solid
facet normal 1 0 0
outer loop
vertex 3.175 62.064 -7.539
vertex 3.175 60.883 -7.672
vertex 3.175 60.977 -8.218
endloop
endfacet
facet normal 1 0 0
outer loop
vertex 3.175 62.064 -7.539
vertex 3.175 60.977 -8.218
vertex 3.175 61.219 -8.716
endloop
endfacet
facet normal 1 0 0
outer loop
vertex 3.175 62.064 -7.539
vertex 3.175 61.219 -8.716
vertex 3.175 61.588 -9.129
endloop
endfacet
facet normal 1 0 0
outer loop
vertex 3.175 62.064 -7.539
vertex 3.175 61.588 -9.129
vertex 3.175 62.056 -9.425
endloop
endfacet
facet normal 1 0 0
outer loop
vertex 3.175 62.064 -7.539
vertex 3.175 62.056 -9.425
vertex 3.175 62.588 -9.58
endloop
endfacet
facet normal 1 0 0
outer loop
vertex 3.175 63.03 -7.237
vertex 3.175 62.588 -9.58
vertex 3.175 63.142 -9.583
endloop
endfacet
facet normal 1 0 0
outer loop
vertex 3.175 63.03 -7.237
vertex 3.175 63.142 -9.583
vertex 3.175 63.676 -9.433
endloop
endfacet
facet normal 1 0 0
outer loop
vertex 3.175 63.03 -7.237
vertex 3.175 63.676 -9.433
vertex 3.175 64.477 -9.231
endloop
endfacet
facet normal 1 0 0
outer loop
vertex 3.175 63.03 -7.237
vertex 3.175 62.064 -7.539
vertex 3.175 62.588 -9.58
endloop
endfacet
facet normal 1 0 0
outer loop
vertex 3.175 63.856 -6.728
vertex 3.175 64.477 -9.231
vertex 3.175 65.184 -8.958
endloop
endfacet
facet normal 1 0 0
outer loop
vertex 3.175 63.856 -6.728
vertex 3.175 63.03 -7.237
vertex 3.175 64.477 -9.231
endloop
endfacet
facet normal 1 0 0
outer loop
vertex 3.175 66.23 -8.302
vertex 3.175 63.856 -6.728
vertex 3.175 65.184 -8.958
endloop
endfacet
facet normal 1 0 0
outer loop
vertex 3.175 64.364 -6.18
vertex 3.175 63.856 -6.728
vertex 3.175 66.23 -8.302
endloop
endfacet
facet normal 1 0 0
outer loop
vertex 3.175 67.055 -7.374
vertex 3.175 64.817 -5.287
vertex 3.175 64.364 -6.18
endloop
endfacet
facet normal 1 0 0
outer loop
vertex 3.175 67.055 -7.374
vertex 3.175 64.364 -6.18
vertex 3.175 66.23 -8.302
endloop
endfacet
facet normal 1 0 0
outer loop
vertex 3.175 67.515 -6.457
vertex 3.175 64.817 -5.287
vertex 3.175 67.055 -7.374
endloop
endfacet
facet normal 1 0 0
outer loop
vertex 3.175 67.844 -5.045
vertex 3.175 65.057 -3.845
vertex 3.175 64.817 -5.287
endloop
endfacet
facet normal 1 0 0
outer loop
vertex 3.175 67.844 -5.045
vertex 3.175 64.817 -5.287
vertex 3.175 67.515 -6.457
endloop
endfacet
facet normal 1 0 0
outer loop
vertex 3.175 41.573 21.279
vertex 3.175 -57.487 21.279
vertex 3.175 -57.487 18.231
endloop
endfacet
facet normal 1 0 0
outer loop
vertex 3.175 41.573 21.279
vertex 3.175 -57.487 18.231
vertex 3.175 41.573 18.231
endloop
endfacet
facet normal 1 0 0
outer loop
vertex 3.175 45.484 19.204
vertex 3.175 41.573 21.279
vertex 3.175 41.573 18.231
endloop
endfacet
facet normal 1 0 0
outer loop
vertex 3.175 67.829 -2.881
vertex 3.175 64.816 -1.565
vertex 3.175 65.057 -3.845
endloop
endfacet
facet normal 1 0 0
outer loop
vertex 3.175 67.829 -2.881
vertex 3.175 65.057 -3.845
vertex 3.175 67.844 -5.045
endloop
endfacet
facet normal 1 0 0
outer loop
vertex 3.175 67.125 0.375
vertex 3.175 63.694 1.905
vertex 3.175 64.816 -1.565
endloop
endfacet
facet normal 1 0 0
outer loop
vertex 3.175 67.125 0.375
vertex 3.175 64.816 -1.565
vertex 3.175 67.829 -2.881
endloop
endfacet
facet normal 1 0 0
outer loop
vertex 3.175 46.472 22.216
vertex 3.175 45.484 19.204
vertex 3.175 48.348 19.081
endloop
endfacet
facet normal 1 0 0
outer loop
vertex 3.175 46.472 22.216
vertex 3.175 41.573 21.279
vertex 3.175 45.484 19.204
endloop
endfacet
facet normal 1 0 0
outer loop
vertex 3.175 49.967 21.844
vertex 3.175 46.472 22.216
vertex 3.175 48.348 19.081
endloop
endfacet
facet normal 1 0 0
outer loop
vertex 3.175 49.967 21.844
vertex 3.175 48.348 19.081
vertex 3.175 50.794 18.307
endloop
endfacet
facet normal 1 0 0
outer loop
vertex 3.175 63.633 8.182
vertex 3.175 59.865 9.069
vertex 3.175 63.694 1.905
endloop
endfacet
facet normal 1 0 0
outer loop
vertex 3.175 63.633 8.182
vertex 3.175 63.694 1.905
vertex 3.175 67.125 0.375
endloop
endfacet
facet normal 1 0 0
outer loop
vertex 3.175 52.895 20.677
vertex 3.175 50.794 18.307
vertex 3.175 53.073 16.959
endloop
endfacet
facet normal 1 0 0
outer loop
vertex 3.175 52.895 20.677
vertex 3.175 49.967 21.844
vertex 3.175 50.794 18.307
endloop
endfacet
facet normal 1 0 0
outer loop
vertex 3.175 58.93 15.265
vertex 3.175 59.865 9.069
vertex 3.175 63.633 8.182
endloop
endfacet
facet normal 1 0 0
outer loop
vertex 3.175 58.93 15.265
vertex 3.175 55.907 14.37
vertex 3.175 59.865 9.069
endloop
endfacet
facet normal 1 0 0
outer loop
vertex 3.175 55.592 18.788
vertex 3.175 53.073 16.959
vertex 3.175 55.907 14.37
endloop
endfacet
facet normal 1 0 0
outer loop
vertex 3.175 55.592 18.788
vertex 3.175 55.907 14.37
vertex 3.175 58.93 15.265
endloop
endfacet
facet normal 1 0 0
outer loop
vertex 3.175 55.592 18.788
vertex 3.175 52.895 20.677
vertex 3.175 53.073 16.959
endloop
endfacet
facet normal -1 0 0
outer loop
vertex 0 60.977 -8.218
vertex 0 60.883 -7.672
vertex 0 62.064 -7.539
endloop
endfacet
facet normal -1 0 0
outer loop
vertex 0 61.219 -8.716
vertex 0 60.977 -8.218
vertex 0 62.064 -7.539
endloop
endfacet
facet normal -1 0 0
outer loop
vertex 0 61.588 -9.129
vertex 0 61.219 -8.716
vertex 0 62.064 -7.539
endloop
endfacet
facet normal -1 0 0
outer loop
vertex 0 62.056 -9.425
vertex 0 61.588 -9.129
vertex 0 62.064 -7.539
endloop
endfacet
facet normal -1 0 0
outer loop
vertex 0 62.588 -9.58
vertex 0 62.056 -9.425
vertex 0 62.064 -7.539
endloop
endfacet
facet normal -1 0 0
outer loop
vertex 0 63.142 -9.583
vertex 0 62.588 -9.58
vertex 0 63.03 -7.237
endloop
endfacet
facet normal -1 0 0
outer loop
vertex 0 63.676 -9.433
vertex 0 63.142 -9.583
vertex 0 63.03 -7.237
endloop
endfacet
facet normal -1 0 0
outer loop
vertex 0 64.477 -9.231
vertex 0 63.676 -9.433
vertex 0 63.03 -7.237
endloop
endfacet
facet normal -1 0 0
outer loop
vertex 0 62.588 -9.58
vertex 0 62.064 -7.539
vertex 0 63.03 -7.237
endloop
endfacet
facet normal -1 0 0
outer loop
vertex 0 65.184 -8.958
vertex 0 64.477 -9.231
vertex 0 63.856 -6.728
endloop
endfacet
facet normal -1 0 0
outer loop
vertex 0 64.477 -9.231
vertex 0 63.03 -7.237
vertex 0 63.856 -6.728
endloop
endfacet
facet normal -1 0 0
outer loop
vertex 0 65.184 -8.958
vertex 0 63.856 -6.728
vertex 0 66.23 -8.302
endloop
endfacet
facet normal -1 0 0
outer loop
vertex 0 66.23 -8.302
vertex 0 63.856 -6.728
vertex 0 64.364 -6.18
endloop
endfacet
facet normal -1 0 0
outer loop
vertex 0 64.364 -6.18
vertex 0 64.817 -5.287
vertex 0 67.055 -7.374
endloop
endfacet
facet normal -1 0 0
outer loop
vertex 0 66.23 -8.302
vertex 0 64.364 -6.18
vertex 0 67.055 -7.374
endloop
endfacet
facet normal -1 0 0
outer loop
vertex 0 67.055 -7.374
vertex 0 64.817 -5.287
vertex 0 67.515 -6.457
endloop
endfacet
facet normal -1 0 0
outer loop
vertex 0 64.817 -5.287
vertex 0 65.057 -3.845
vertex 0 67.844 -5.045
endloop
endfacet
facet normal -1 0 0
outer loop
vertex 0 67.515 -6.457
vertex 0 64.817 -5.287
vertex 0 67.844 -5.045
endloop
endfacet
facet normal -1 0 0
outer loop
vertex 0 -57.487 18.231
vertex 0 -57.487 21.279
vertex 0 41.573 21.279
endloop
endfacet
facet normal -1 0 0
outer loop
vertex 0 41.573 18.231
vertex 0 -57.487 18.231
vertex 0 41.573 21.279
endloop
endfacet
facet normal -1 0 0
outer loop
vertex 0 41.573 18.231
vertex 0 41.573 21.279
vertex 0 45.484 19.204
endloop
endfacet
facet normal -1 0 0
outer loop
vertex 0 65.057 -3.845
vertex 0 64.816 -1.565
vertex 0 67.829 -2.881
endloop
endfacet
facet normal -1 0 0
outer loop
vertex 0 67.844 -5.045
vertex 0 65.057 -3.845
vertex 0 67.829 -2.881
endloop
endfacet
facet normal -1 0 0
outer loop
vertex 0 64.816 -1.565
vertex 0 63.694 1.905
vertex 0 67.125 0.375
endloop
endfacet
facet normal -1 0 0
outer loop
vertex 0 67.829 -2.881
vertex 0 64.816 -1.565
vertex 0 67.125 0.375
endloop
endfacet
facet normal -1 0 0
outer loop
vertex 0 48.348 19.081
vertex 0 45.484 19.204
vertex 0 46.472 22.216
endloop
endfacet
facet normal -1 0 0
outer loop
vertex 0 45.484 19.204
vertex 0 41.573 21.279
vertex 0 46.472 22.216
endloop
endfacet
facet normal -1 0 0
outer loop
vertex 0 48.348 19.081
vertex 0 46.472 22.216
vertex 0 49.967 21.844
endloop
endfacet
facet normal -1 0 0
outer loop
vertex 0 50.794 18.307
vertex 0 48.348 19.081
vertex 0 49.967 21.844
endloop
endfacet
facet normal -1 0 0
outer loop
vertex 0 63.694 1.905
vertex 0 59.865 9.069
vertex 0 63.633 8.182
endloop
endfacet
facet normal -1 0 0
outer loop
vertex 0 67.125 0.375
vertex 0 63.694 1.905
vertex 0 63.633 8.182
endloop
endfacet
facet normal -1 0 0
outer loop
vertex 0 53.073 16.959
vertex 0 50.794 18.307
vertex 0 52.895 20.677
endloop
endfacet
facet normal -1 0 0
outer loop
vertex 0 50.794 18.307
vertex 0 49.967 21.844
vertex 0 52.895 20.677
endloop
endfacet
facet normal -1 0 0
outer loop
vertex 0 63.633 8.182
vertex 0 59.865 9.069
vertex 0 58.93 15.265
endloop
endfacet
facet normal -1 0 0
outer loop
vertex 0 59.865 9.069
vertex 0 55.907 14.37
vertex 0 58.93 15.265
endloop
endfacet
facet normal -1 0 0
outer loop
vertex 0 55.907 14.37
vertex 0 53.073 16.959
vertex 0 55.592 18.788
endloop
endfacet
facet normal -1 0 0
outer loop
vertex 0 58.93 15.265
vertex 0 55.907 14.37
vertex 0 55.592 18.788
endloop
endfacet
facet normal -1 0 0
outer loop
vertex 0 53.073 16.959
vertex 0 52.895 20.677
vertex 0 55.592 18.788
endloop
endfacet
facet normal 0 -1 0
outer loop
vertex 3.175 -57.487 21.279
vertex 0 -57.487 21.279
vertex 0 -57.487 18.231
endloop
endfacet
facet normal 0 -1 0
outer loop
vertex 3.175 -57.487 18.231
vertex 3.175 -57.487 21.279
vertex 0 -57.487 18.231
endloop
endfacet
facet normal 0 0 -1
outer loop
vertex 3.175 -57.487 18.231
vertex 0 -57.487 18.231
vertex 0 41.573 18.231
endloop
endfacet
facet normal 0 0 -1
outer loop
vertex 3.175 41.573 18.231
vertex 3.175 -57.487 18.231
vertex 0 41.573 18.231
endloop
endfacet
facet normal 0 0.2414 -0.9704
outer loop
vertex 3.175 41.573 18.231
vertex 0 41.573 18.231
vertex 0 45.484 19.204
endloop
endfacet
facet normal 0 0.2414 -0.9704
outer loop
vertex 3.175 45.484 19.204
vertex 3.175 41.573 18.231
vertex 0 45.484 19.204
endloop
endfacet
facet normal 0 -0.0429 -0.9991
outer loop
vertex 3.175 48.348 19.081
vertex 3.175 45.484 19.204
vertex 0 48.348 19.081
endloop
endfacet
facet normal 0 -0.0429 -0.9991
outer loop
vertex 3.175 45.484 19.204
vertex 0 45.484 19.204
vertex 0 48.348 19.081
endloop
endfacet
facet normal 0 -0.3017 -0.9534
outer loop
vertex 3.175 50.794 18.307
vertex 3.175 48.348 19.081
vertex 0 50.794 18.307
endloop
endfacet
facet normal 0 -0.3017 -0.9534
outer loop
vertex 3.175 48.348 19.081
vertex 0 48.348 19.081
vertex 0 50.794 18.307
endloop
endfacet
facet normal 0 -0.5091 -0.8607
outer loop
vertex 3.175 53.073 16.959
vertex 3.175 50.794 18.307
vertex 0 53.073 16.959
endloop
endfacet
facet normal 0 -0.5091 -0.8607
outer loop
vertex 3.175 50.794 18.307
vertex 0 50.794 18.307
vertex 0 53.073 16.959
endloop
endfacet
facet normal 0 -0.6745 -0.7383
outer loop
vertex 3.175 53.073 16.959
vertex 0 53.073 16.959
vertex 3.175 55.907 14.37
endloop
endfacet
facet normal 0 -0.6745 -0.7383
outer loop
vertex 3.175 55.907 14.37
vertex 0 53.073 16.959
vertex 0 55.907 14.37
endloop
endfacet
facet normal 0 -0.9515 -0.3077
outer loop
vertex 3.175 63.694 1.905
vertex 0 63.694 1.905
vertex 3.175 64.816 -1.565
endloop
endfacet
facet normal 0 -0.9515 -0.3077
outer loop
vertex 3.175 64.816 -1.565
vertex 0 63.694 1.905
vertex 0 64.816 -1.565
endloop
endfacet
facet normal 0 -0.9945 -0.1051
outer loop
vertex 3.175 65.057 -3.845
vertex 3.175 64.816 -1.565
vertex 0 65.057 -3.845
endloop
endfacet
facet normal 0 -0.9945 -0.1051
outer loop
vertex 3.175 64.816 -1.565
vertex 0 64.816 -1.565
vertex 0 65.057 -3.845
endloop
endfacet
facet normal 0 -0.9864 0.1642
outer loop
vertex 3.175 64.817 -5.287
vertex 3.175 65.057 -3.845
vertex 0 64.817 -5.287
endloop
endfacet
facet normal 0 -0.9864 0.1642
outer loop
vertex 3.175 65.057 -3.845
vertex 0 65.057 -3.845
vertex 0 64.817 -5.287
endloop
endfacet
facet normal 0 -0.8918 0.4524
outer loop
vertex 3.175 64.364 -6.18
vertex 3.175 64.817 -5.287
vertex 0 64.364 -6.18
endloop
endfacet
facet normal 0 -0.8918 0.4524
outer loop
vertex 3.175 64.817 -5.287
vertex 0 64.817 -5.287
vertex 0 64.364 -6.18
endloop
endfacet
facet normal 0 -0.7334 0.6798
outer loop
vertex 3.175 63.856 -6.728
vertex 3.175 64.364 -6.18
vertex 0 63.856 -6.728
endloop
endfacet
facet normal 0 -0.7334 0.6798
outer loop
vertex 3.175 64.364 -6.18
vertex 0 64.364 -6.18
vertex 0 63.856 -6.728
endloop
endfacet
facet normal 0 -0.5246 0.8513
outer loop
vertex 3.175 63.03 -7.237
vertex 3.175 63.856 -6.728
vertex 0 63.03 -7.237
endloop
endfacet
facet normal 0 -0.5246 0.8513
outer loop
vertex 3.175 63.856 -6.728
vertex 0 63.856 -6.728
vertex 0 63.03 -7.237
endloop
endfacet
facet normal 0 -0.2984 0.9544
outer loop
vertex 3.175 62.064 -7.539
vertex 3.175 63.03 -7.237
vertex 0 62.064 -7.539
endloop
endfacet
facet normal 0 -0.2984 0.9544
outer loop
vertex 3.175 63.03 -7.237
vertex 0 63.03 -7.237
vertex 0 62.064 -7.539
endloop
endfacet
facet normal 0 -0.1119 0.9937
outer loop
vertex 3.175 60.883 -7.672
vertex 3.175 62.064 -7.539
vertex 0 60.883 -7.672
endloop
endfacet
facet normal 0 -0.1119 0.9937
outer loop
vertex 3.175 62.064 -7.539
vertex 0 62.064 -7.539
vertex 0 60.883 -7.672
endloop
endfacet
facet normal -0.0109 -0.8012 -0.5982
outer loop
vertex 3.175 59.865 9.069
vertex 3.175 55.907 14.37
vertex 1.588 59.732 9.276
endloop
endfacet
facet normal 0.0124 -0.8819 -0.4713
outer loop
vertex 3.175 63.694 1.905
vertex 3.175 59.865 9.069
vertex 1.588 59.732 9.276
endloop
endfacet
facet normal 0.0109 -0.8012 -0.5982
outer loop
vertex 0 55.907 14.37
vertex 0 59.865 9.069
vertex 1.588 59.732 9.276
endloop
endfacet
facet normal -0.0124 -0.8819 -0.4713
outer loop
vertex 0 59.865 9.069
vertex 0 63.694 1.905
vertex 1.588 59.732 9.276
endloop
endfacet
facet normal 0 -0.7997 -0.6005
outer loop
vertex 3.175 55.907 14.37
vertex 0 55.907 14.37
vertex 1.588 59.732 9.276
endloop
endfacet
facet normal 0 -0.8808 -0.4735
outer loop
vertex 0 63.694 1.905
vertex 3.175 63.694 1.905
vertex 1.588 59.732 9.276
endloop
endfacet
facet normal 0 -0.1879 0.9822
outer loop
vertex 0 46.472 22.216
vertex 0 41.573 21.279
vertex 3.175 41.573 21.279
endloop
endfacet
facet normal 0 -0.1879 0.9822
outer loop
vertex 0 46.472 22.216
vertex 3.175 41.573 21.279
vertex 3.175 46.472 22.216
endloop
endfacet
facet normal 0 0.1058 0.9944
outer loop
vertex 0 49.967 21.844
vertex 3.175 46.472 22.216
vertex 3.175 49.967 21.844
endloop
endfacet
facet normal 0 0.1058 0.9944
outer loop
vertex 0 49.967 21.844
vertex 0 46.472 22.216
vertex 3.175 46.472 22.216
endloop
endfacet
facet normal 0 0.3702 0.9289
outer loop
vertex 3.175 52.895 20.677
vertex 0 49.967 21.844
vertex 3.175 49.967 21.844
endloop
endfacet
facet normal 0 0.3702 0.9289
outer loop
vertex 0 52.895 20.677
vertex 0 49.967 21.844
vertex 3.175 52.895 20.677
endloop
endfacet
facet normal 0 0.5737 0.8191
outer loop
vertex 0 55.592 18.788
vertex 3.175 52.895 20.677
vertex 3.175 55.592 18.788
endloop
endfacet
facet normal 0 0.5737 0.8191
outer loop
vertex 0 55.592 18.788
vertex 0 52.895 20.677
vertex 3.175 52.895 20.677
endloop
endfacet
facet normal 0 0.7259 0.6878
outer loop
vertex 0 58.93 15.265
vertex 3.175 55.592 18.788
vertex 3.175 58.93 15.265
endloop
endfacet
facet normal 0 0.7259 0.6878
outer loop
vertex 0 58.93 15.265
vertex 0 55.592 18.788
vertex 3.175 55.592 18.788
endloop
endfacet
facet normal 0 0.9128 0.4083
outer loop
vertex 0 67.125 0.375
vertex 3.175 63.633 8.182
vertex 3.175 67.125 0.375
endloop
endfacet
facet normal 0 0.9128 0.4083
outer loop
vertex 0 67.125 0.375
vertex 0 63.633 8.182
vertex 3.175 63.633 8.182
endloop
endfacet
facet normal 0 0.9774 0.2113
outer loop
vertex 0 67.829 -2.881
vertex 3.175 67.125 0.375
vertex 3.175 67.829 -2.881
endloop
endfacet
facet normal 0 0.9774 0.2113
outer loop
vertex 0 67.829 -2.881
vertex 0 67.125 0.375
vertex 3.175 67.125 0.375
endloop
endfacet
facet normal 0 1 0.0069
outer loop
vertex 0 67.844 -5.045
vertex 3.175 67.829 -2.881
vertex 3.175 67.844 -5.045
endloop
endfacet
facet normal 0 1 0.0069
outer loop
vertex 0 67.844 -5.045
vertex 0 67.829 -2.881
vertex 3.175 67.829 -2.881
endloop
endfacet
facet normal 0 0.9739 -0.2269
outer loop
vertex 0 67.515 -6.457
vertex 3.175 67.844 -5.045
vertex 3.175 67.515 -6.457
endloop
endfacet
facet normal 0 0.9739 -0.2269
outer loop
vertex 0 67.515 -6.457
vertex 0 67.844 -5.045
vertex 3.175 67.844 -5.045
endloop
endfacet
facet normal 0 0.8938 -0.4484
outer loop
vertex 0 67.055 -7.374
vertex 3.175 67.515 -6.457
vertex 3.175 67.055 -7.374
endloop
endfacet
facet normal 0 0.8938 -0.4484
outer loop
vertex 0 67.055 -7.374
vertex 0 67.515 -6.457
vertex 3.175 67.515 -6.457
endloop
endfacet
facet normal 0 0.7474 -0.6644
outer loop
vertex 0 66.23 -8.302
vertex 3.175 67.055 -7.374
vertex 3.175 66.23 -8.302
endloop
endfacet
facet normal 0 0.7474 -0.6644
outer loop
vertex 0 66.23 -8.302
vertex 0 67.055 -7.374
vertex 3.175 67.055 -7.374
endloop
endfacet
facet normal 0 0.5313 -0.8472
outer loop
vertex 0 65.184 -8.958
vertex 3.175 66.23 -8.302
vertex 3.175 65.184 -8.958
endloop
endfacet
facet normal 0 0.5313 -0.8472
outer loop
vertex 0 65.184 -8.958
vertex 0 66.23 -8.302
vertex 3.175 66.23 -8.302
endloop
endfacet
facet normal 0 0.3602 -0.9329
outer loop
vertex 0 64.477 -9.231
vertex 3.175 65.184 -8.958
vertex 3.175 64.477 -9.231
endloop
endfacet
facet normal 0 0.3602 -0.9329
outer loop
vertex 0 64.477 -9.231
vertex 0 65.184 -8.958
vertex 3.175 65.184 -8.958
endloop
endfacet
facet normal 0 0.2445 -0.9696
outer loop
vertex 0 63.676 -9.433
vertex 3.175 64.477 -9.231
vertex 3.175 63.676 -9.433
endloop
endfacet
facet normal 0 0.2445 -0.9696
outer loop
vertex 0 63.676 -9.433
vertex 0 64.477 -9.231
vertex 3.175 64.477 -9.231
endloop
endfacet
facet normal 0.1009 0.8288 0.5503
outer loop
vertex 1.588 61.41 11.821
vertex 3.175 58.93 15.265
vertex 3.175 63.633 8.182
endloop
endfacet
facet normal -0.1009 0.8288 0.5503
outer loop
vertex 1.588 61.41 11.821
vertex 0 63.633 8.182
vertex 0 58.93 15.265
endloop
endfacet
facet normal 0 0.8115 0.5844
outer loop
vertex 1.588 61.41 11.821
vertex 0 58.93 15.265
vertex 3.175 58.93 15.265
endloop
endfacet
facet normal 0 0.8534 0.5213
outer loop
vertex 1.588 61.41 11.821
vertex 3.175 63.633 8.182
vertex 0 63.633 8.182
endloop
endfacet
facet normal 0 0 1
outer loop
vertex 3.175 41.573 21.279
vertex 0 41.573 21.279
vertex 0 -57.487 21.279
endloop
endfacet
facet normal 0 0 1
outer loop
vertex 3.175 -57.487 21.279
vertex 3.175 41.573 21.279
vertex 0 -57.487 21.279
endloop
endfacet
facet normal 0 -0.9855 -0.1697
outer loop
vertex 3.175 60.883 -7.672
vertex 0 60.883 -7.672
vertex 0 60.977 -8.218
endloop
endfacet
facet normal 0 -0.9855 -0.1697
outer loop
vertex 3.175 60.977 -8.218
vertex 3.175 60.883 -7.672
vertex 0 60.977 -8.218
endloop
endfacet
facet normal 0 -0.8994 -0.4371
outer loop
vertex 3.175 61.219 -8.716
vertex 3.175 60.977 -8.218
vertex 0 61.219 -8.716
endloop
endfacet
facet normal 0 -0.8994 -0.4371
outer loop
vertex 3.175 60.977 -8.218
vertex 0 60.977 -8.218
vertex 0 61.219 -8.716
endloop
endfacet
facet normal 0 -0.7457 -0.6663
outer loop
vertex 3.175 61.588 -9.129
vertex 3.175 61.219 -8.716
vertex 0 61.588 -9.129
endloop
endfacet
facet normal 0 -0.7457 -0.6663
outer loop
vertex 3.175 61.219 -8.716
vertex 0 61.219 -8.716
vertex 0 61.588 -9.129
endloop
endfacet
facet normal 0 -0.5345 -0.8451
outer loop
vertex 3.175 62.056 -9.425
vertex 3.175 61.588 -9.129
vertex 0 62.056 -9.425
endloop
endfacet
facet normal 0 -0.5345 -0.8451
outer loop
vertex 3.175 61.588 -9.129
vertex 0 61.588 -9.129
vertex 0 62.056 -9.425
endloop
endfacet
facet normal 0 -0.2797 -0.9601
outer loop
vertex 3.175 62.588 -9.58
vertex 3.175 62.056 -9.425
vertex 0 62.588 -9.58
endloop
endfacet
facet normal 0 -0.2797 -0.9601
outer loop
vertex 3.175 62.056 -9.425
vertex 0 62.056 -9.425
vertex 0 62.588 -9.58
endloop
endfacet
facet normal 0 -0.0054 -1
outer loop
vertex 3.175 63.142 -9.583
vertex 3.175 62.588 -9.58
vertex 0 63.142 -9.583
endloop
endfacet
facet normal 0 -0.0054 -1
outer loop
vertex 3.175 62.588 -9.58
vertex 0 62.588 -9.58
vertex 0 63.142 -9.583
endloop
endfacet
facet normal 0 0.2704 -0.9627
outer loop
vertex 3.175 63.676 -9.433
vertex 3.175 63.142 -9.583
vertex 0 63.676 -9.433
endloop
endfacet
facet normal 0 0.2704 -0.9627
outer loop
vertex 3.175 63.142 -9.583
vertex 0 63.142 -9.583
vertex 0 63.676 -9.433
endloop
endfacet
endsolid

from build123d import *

# Parameters (mm, degrees)
F1_DEPTH = 3.175


with BuildPart() as f1:
    # F0 (on Right) → F1 (new body)
    with BuildSketch(Plane.YZ):
        with BuildLine():
            Line((41.5727805566, 21.2788749112), (-57.4872194434, 21.2788749112))
            Line((-57.4872194434, 21.2788749112), (-57.4872194434, 18.2308749112))
            Line((-57.4872194434, 18.2308749112), (41.5727805566, 18.2308749112))
            add(Edge.make_bspline(
                [(41.5727805566, 18.2308749112), (49.5192518818, 21.3740867433), (59.6344478786, 12.8472307337), (68.4785019542, -7.4157701366), (60.8827510452, -7.6716801462)],
                knots=[0, 0, 0, 0, 0.5219314623, 1, 1, 1, 1], degree=3))
            ThreePointArc((60.8827510452, -7.6716801462), (61.811727417, -9.2935680541), (63.6755938667, -9.4332796962))
            add(Edge.make_bspline(
                [(41.5727805566, 21.2788749112), (50.5056689295, 24.2580571675), (61.544379535, 15.6663643407), (71.7502984163, -7.8613617778), (63.6755938667, -9.4332796962)],
                knots=[0, 0, 0, 0, 0.5034739391, 1, 1, 1, 1], degree=3))
        make_face()
    extrude(amount=F1_DEPTH)


solid = f1.part
